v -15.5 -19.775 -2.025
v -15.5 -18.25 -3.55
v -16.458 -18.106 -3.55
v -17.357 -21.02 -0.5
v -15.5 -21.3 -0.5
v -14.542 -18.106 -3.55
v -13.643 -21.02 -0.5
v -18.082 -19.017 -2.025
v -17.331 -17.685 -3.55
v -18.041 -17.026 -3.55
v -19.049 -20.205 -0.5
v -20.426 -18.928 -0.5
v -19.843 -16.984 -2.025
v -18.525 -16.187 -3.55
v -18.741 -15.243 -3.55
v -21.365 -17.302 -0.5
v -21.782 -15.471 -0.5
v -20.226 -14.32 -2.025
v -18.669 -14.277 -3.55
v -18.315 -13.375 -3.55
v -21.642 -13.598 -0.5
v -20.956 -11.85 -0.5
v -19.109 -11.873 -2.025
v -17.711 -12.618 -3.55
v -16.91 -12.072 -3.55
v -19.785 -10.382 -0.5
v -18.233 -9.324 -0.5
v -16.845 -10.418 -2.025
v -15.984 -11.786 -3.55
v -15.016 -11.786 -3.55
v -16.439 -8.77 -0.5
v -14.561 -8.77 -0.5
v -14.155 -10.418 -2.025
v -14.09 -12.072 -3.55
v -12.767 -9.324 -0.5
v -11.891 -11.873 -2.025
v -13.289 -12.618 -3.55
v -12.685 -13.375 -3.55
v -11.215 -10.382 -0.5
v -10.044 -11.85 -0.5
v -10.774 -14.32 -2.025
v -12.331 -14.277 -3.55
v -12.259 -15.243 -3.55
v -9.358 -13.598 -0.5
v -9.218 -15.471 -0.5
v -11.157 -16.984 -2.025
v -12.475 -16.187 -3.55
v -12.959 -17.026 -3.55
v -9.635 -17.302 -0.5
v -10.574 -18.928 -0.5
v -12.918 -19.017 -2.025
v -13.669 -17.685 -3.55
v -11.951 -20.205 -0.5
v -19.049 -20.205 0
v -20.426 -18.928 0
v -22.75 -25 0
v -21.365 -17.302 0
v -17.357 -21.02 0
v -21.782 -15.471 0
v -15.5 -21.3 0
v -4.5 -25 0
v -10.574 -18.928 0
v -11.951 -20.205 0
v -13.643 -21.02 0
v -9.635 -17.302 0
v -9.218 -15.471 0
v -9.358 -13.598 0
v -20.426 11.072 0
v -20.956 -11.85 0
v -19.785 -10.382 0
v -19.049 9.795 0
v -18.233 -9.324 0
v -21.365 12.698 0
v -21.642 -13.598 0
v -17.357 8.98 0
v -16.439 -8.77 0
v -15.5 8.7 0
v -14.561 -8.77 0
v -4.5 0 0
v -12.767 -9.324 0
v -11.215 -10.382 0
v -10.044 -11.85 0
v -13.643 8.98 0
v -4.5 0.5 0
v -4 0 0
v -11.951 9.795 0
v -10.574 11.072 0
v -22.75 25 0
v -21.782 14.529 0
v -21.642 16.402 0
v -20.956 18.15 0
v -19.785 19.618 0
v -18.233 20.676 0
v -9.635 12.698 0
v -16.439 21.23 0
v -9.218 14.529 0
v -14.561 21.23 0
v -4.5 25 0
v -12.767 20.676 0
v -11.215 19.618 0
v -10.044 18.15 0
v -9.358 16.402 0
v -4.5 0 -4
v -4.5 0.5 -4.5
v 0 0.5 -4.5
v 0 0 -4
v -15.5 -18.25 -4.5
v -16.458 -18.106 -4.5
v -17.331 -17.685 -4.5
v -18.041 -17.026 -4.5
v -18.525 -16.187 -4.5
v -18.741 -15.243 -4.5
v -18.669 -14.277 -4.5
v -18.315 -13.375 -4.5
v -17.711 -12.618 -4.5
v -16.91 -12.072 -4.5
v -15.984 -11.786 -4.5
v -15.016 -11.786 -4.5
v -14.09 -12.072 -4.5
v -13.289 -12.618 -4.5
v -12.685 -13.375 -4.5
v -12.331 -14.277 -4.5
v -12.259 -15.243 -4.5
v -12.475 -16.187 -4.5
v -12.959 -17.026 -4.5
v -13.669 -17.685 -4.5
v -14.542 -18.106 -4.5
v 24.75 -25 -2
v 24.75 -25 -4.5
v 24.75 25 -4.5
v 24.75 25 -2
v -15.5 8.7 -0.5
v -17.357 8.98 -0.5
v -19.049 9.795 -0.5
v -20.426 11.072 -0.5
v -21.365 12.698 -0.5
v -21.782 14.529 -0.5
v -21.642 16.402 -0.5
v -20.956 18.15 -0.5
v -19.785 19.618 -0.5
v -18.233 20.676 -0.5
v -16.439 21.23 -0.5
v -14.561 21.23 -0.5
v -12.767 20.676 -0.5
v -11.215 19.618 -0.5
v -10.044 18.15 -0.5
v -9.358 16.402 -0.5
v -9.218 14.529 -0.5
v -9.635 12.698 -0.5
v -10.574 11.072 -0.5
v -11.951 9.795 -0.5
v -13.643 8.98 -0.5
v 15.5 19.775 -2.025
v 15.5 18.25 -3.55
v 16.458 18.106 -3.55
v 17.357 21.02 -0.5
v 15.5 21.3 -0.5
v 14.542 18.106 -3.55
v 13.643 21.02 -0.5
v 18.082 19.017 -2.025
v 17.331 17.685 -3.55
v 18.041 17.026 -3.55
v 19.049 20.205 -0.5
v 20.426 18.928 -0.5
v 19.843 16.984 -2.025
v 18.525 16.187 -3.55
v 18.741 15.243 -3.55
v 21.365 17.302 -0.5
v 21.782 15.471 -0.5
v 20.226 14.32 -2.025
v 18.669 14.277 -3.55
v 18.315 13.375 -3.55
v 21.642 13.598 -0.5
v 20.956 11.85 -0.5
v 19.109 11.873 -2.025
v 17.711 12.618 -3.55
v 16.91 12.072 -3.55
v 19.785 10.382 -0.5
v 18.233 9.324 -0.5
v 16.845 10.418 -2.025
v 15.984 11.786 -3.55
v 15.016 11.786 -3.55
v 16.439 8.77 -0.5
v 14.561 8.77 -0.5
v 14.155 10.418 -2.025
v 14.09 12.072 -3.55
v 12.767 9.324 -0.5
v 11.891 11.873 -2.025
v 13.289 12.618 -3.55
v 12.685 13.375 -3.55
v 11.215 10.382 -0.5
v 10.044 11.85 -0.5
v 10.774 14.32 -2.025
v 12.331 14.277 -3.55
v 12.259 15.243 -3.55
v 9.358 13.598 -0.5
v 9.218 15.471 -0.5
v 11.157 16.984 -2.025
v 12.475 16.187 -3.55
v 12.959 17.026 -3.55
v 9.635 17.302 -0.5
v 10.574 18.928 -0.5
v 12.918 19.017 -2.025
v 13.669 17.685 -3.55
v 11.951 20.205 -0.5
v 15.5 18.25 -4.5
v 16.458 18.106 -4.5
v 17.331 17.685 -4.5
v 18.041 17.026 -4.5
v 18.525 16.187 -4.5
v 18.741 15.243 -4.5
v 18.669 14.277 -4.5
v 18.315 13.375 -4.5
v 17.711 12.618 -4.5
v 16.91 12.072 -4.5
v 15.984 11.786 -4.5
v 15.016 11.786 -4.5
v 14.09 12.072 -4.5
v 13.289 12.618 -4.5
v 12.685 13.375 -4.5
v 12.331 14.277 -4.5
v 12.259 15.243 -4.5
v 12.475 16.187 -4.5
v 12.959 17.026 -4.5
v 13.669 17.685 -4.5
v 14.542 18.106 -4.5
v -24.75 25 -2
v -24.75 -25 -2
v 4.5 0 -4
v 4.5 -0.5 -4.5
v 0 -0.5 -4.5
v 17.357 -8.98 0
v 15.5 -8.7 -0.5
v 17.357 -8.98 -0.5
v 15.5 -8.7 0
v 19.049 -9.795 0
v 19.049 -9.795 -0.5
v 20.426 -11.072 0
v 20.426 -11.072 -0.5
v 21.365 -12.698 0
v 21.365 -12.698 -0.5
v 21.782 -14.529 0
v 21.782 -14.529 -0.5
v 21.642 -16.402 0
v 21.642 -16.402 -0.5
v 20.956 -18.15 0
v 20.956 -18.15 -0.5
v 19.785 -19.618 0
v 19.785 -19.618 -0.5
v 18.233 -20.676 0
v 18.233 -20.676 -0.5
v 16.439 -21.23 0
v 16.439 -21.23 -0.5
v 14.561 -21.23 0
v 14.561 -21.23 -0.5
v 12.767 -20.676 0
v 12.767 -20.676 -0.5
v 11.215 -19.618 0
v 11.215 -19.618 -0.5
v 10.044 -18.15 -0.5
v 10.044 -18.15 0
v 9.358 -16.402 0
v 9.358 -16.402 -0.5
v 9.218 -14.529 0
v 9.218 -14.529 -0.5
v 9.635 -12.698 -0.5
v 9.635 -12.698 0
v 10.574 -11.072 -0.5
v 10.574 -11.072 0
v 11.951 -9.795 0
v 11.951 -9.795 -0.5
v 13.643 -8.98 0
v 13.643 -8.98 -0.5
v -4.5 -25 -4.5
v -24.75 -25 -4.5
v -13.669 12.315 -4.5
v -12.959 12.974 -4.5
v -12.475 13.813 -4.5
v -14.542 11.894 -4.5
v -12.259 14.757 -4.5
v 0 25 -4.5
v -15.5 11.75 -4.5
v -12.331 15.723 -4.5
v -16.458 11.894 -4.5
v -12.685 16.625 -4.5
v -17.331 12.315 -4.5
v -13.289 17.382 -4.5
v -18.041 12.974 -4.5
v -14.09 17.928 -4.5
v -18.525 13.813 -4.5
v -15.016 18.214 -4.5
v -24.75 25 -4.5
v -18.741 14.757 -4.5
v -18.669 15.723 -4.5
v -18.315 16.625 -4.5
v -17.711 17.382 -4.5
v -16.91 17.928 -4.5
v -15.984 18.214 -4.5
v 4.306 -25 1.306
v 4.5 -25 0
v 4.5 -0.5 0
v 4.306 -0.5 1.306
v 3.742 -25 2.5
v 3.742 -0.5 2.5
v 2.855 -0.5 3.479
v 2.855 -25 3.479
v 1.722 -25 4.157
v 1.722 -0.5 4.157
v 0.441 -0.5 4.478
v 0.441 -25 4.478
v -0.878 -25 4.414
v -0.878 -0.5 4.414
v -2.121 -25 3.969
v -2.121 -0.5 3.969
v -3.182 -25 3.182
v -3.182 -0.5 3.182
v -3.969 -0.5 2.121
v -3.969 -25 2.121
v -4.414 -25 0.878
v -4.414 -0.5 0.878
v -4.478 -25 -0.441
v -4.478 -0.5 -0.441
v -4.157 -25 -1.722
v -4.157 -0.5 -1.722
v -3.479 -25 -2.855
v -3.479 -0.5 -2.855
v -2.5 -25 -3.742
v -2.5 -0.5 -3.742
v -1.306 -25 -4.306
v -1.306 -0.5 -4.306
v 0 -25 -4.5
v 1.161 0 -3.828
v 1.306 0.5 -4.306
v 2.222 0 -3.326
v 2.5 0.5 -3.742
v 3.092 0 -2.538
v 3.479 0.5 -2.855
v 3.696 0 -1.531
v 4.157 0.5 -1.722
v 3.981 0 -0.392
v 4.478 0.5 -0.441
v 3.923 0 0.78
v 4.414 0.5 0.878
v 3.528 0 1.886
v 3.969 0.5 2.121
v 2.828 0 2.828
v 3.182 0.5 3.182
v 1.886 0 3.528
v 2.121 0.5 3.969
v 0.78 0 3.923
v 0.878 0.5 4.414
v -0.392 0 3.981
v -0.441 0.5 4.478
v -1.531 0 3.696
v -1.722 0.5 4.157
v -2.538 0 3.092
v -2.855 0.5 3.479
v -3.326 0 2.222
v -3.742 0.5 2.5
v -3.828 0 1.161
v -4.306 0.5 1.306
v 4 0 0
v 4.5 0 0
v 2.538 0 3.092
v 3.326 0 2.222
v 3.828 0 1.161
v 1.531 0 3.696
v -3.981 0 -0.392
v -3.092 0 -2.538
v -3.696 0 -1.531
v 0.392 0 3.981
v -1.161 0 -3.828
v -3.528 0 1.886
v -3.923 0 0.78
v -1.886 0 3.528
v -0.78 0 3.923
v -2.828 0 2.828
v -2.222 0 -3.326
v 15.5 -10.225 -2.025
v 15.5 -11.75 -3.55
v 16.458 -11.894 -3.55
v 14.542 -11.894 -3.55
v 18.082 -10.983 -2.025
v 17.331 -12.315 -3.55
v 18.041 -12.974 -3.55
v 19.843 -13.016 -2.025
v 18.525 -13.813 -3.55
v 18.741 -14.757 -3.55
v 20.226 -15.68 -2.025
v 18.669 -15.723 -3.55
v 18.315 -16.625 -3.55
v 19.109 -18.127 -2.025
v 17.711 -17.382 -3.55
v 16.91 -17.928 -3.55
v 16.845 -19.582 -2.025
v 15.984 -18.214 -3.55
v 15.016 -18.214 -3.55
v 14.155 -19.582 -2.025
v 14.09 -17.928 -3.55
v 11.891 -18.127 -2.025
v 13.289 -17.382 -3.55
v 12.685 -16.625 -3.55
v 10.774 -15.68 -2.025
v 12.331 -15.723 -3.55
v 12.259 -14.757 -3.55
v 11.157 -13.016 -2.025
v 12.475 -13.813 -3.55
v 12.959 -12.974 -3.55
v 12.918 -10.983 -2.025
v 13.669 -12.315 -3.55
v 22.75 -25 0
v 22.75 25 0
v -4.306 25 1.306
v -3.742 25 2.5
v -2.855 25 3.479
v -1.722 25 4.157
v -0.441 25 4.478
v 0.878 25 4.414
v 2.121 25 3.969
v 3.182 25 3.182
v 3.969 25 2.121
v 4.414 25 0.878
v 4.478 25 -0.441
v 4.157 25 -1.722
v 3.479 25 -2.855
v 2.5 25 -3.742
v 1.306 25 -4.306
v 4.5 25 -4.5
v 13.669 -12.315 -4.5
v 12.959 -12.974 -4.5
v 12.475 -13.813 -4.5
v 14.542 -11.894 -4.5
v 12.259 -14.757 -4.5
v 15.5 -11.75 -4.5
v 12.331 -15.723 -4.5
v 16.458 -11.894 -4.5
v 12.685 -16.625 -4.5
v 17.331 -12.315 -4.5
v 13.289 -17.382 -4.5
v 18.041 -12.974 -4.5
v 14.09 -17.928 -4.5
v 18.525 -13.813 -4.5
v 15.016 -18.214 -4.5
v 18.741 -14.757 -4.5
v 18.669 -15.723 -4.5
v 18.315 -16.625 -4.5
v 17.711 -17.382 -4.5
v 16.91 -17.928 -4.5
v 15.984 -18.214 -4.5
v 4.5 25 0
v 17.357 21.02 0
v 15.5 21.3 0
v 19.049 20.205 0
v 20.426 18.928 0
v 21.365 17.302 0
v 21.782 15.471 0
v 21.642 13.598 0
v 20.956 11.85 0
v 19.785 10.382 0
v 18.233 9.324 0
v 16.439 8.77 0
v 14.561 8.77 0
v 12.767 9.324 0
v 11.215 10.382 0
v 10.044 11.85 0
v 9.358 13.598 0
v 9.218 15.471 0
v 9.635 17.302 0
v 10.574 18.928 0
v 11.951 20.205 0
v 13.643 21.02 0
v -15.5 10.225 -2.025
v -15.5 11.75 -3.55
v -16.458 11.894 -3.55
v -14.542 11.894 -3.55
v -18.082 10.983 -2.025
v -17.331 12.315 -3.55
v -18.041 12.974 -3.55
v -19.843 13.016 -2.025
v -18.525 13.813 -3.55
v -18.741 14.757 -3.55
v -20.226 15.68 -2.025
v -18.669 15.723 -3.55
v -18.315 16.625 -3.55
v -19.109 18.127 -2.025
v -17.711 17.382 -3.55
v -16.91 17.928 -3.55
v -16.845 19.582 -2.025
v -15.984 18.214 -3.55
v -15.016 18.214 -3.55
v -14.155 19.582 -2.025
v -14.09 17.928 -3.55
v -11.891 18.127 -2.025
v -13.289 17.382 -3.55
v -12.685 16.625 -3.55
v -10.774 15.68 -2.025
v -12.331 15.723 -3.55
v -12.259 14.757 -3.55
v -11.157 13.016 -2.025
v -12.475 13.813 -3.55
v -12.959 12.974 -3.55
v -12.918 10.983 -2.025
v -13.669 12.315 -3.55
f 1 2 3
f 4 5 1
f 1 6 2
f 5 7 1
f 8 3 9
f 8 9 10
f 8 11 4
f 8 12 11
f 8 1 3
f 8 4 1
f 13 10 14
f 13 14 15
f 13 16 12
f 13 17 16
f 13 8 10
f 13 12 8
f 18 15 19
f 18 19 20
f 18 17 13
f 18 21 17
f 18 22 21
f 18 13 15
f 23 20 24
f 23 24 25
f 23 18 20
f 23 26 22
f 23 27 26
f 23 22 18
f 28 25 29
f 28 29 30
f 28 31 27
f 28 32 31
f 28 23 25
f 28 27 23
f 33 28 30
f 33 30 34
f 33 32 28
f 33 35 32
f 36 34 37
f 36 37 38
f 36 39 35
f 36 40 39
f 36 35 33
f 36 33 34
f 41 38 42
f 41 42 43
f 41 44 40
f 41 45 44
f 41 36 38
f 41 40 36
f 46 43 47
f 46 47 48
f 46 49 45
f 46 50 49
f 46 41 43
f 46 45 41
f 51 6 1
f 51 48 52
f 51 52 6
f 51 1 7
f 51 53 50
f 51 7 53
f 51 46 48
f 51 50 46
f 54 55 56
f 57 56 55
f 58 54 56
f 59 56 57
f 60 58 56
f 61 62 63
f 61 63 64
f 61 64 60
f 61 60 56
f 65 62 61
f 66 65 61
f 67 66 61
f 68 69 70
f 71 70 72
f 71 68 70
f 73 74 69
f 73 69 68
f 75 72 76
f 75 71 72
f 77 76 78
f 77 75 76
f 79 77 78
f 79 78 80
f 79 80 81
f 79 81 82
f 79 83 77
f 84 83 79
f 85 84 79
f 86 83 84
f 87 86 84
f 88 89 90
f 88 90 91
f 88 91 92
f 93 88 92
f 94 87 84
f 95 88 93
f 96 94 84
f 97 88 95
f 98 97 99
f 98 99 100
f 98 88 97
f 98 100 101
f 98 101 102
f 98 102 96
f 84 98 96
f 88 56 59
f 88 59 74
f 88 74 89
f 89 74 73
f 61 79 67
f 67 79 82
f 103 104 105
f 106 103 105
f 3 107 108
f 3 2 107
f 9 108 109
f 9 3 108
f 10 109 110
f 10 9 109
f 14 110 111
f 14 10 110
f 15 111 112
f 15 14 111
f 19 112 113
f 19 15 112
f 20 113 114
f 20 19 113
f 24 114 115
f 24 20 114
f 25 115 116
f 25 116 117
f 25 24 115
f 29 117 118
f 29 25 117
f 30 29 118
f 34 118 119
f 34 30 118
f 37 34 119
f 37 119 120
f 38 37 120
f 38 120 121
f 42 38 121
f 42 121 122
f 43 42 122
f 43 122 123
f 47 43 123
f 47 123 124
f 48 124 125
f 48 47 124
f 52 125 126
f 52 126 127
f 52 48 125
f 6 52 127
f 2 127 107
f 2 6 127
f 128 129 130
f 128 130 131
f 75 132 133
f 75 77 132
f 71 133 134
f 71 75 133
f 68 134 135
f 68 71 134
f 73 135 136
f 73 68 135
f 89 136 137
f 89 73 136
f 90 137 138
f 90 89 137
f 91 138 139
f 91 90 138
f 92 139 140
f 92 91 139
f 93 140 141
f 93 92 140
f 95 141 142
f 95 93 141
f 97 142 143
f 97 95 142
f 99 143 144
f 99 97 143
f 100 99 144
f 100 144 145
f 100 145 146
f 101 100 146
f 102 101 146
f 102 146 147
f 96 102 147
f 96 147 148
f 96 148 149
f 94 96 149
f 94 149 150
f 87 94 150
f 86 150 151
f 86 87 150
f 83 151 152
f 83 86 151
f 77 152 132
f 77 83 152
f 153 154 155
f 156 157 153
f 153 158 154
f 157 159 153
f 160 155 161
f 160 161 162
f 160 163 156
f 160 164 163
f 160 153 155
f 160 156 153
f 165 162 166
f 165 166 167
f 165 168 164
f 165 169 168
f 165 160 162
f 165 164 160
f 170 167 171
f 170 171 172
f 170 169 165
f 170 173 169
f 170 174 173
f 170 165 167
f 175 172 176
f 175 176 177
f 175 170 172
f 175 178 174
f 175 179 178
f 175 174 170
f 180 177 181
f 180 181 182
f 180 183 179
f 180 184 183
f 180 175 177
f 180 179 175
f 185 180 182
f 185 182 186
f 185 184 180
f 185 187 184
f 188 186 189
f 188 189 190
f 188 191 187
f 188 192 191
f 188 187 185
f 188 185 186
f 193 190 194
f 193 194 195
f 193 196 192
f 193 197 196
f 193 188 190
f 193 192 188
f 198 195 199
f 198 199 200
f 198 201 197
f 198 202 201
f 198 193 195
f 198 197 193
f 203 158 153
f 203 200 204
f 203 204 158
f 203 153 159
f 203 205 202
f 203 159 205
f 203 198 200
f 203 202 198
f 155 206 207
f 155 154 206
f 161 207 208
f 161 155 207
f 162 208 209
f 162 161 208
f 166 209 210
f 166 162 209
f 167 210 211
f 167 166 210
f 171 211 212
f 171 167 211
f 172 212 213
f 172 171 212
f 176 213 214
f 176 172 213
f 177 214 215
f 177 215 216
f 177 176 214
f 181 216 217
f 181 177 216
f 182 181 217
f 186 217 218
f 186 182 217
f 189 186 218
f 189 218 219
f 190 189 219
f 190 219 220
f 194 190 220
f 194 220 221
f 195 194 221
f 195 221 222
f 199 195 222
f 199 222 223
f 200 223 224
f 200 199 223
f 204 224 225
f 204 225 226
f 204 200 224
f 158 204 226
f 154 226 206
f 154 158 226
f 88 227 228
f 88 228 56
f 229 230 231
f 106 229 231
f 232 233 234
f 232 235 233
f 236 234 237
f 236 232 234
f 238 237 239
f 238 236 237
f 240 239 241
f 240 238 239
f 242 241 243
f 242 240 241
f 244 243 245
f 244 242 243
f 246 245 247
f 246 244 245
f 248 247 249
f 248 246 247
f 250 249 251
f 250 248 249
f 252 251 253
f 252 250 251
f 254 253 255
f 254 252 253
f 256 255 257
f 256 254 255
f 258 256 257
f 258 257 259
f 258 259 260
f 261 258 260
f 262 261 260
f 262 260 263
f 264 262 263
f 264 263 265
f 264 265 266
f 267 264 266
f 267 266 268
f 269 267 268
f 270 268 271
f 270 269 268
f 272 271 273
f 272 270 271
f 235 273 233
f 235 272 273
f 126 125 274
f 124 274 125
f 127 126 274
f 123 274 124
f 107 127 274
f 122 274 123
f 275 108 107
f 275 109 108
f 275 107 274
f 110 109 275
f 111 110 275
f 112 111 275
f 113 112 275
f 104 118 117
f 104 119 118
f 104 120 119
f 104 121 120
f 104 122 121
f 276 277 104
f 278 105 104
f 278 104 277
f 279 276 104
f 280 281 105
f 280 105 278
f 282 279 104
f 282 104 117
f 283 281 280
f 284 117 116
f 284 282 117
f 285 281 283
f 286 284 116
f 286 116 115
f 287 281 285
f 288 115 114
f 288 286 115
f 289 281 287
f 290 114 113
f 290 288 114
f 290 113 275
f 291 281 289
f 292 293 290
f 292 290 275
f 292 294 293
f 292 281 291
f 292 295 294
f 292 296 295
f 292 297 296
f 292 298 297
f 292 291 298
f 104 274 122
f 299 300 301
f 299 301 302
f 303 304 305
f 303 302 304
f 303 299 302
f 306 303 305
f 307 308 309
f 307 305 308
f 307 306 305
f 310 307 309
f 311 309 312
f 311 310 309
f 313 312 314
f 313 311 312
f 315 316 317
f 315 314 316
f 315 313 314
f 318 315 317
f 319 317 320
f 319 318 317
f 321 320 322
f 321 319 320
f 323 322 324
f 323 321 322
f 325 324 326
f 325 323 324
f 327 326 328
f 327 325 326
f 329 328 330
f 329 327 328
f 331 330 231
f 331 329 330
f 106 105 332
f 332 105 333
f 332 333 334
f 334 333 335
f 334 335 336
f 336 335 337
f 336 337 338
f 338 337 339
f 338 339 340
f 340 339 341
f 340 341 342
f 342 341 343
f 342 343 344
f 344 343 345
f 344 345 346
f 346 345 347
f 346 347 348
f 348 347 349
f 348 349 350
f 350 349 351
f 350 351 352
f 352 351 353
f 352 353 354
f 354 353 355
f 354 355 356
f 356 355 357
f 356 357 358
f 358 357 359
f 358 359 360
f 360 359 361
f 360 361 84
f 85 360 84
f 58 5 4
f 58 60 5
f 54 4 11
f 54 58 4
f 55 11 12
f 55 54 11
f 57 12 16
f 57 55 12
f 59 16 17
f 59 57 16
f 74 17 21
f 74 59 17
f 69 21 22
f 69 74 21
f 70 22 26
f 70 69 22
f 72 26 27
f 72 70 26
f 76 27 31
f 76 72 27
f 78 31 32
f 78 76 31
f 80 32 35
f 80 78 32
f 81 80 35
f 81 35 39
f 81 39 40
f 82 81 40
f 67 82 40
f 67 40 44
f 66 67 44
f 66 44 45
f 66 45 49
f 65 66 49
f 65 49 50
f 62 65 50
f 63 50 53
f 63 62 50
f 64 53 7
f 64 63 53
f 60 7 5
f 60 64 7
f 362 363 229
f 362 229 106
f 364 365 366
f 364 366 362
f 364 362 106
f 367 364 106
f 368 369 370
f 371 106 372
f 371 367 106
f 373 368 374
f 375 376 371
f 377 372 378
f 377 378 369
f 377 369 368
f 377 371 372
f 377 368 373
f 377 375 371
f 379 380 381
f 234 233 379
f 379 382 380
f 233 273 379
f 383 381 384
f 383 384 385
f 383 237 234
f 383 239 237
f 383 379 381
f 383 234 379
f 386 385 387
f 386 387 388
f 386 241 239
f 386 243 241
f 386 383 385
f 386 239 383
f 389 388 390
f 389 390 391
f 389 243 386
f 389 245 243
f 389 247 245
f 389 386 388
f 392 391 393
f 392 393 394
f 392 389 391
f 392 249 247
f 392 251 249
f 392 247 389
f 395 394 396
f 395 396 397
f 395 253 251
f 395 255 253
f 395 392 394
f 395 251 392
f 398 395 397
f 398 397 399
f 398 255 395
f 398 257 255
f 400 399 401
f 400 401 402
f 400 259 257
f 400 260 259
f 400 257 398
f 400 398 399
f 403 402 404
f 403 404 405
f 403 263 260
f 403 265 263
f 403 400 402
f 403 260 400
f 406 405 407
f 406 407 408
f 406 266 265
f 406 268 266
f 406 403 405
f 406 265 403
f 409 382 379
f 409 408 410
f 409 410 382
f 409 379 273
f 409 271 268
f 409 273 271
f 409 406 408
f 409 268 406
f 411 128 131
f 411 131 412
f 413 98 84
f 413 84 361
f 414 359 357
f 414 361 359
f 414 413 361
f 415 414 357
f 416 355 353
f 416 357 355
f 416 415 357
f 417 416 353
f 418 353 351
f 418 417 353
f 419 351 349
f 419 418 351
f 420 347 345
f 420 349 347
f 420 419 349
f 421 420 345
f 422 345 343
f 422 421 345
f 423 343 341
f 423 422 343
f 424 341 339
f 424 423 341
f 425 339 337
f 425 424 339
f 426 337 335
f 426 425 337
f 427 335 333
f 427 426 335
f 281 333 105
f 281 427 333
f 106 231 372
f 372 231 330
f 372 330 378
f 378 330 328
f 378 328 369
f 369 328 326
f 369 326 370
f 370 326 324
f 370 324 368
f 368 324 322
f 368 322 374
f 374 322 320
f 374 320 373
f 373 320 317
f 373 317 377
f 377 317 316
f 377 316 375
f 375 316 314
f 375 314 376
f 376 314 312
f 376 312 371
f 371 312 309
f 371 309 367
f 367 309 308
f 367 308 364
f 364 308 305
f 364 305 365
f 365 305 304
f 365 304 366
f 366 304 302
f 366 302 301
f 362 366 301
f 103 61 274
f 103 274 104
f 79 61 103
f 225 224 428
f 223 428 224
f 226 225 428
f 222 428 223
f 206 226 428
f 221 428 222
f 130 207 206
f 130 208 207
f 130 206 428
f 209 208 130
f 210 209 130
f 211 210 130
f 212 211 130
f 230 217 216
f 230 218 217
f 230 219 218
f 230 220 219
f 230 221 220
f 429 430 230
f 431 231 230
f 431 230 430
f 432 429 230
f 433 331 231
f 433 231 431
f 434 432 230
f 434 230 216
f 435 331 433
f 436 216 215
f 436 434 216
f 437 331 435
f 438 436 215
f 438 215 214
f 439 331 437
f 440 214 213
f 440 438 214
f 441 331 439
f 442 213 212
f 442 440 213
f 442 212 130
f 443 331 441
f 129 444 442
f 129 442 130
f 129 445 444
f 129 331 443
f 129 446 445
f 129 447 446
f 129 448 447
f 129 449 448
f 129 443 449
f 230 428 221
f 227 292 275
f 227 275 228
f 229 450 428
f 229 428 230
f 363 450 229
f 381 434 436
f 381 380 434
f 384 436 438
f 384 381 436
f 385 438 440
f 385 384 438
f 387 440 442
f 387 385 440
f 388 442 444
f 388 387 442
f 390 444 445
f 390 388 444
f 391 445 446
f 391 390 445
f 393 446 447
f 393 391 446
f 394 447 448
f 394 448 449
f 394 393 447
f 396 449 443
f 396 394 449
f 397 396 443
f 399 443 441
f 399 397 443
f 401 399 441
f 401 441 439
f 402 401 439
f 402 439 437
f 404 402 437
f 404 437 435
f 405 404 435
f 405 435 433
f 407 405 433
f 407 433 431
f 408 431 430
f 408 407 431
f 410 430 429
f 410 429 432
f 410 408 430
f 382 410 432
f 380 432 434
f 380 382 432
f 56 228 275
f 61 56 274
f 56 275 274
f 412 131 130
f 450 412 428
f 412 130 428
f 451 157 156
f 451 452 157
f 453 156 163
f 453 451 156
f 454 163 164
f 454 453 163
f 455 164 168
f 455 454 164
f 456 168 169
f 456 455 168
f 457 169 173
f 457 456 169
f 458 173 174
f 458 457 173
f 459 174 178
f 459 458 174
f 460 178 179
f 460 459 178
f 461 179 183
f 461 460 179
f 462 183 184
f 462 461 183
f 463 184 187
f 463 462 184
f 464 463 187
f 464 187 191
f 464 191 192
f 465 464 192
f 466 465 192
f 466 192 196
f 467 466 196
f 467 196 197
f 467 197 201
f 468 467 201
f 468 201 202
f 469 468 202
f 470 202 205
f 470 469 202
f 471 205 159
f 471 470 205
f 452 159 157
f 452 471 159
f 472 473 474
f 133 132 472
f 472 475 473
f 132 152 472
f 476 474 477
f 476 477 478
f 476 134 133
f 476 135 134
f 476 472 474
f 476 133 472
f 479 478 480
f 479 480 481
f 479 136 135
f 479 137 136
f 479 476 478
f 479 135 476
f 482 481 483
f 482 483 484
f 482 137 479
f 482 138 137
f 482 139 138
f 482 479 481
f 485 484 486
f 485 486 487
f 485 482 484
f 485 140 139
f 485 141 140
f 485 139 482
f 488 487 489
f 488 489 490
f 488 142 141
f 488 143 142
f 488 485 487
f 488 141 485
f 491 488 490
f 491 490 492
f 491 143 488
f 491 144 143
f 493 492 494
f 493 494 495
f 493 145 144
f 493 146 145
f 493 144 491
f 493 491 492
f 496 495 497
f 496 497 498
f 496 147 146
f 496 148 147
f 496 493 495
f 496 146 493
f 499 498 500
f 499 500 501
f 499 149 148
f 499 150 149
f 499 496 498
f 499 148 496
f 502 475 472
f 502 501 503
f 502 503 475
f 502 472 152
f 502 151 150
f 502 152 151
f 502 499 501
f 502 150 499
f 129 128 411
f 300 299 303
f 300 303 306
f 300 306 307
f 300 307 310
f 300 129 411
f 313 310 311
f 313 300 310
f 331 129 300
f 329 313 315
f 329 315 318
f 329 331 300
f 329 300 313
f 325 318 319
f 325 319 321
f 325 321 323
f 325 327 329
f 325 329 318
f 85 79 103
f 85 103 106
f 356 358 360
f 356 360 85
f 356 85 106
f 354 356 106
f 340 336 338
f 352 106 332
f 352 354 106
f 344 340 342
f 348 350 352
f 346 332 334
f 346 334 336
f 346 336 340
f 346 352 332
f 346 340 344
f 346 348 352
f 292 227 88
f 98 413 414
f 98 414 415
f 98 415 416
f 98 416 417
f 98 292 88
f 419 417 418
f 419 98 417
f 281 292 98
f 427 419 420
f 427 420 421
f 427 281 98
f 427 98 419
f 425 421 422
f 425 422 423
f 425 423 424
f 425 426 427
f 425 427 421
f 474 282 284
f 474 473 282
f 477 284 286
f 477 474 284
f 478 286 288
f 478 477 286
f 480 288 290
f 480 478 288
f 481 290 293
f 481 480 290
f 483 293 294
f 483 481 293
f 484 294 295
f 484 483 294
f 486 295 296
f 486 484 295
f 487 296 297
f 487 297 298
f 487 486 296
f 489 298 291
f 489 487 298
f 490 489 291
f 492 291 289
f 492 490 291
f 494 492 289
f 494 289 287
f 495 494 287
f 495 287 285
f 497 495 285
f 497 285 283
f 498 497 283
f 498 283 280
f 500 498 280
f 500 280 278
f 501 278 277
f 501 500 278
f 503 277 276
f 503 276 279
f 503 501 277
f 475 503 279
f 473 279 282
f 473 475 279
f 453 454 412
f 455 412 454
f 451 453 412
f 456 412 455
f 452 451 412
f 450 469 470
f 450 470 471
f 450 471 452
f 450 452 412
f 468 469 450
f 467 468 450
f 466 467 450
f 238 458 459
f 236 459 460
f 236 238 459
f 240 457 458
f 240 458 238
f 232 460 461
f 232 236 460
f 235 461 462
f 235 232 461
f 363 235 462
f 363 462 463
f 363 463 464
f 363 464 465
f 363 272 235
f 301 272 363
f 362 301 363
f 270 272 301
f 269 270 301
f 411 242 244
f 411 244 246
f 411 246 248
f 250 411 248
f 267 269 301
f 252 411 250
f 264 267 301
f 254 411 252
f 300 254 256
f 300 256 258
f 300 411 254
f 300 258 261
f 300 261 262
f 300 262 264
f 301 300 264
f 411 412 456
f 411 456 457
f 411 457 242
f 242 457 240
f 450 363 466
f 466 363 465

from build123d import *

# Parameters (mm, degrees)
EXTRUDE_1_DEPTH            = 25
SKETCH_3_W                 = 9
SKETCH_3_H                 = 25
CUT_EXTRUDE_1_DEPTH        = 5.5
CUT_EXTRUDE_1_DEPTH_BACK   = 5.5
HOLE_WIZARD_M61_AT_2_COUNT = 2
HOLE_WIZARD_M61_AT_2_PITCH = 30
CHAMFER_1_SIZE             = 0.5
PATTERN_CIRCULAR_1_COUNT   = 2


with BuildPart() as part:
    # Эскиз1 → Бобышка-Вытянуть1 (new body, symmetric)
    with BuildSketch(Plane(origin=(0, 0, 0), x_dir=(1, 0, 0), z_dir=(0, 1, 0))):
        with BuildLine():
            Line((0, 4.5), (-24.75, 4.5))
            Line((-24.75, 4.5), (-24.75, 2))
            Line((-24.75, 2), (-22.75, 0))
            Line((-22.75, 0), (-4.5, 0))
            ThreePointArc((-4.5, 0), (3.181980515, -3.181980515), (0, 4.5))
        make_face()
    extrude(amount=EXTRUDE_1_DEPTH, both=True)

    # Эскиз3 → Вырез-Вытянуть1 (cut, two sides)
    with BuildSketch(Plane.XY) as cut_extrude_1_sk:
        with Locations((0, -12.5)):
            Rectangle(SKETCH_3_W, SKETCH_3_H)
    extrude(amount=CUT_EXTRUDE_1_DEPTH, mode=Mode.SUBTRACT)
    extrude(cut_extrude_1_sk.sketch, amount=-CUT_EXTRUDE_1_DEPTH_BACK, mode=Mode.SUBTRACT)

    # Эскиз6 → Зенковка для винта с полупотайной головкой M61 (revolve, cut)
    with BuildSketch(Plane(origin=(-15.5, 15, 0), x_dir=(0, -1, 0), z_dir=(1, 0, 0))):
        Polygon((0, 0), (0, 4.5), (3.25, 4.5), (3.25, 3.55), (6.3, 0.5), (6.3, 0), align=None)
    hole_wizard_m61 = revolve(axis=Axis((-15.5, 15, 6.35), (0, 0, -1)), mode=Mode.SUBTRACT)

    # Зенковка для винта с полупотайной головкой M61 at 2: Зенковка для винта с полупотайной головкой M61 ×2
    with Locations(*[(0, -i * HOLE_WIZARD_M61_AT_2_PITCH, 0) for i in range(1, HOLE_WIZARD_M61_AT_2_COUNT)]):
        add(hole_wizard_m61, mode=Mode.SUBTRACT)

    # Фаска1
    chamfer_1_edges = [part.edges().sort_by_distance(p)[0] for p in [
        (3.181980515, 0, 3.181980515),
        (-2.25, 0, -4.5),
    ]]
    chamfer(chamfer_1_edges, length=CHAMFER_1_SIZE)


with BuildPart() as pattern_circular_1_1:
    # Круговой массив1: pattern copy
    add(part.part.rotate(Axis((0, 0, 0), (0, 0, 1)), 1 * 360 / PATTERN_CIRCULAR_1_COUNT))


solid = Compound([part.part, pattern_circular_1_1.part])
